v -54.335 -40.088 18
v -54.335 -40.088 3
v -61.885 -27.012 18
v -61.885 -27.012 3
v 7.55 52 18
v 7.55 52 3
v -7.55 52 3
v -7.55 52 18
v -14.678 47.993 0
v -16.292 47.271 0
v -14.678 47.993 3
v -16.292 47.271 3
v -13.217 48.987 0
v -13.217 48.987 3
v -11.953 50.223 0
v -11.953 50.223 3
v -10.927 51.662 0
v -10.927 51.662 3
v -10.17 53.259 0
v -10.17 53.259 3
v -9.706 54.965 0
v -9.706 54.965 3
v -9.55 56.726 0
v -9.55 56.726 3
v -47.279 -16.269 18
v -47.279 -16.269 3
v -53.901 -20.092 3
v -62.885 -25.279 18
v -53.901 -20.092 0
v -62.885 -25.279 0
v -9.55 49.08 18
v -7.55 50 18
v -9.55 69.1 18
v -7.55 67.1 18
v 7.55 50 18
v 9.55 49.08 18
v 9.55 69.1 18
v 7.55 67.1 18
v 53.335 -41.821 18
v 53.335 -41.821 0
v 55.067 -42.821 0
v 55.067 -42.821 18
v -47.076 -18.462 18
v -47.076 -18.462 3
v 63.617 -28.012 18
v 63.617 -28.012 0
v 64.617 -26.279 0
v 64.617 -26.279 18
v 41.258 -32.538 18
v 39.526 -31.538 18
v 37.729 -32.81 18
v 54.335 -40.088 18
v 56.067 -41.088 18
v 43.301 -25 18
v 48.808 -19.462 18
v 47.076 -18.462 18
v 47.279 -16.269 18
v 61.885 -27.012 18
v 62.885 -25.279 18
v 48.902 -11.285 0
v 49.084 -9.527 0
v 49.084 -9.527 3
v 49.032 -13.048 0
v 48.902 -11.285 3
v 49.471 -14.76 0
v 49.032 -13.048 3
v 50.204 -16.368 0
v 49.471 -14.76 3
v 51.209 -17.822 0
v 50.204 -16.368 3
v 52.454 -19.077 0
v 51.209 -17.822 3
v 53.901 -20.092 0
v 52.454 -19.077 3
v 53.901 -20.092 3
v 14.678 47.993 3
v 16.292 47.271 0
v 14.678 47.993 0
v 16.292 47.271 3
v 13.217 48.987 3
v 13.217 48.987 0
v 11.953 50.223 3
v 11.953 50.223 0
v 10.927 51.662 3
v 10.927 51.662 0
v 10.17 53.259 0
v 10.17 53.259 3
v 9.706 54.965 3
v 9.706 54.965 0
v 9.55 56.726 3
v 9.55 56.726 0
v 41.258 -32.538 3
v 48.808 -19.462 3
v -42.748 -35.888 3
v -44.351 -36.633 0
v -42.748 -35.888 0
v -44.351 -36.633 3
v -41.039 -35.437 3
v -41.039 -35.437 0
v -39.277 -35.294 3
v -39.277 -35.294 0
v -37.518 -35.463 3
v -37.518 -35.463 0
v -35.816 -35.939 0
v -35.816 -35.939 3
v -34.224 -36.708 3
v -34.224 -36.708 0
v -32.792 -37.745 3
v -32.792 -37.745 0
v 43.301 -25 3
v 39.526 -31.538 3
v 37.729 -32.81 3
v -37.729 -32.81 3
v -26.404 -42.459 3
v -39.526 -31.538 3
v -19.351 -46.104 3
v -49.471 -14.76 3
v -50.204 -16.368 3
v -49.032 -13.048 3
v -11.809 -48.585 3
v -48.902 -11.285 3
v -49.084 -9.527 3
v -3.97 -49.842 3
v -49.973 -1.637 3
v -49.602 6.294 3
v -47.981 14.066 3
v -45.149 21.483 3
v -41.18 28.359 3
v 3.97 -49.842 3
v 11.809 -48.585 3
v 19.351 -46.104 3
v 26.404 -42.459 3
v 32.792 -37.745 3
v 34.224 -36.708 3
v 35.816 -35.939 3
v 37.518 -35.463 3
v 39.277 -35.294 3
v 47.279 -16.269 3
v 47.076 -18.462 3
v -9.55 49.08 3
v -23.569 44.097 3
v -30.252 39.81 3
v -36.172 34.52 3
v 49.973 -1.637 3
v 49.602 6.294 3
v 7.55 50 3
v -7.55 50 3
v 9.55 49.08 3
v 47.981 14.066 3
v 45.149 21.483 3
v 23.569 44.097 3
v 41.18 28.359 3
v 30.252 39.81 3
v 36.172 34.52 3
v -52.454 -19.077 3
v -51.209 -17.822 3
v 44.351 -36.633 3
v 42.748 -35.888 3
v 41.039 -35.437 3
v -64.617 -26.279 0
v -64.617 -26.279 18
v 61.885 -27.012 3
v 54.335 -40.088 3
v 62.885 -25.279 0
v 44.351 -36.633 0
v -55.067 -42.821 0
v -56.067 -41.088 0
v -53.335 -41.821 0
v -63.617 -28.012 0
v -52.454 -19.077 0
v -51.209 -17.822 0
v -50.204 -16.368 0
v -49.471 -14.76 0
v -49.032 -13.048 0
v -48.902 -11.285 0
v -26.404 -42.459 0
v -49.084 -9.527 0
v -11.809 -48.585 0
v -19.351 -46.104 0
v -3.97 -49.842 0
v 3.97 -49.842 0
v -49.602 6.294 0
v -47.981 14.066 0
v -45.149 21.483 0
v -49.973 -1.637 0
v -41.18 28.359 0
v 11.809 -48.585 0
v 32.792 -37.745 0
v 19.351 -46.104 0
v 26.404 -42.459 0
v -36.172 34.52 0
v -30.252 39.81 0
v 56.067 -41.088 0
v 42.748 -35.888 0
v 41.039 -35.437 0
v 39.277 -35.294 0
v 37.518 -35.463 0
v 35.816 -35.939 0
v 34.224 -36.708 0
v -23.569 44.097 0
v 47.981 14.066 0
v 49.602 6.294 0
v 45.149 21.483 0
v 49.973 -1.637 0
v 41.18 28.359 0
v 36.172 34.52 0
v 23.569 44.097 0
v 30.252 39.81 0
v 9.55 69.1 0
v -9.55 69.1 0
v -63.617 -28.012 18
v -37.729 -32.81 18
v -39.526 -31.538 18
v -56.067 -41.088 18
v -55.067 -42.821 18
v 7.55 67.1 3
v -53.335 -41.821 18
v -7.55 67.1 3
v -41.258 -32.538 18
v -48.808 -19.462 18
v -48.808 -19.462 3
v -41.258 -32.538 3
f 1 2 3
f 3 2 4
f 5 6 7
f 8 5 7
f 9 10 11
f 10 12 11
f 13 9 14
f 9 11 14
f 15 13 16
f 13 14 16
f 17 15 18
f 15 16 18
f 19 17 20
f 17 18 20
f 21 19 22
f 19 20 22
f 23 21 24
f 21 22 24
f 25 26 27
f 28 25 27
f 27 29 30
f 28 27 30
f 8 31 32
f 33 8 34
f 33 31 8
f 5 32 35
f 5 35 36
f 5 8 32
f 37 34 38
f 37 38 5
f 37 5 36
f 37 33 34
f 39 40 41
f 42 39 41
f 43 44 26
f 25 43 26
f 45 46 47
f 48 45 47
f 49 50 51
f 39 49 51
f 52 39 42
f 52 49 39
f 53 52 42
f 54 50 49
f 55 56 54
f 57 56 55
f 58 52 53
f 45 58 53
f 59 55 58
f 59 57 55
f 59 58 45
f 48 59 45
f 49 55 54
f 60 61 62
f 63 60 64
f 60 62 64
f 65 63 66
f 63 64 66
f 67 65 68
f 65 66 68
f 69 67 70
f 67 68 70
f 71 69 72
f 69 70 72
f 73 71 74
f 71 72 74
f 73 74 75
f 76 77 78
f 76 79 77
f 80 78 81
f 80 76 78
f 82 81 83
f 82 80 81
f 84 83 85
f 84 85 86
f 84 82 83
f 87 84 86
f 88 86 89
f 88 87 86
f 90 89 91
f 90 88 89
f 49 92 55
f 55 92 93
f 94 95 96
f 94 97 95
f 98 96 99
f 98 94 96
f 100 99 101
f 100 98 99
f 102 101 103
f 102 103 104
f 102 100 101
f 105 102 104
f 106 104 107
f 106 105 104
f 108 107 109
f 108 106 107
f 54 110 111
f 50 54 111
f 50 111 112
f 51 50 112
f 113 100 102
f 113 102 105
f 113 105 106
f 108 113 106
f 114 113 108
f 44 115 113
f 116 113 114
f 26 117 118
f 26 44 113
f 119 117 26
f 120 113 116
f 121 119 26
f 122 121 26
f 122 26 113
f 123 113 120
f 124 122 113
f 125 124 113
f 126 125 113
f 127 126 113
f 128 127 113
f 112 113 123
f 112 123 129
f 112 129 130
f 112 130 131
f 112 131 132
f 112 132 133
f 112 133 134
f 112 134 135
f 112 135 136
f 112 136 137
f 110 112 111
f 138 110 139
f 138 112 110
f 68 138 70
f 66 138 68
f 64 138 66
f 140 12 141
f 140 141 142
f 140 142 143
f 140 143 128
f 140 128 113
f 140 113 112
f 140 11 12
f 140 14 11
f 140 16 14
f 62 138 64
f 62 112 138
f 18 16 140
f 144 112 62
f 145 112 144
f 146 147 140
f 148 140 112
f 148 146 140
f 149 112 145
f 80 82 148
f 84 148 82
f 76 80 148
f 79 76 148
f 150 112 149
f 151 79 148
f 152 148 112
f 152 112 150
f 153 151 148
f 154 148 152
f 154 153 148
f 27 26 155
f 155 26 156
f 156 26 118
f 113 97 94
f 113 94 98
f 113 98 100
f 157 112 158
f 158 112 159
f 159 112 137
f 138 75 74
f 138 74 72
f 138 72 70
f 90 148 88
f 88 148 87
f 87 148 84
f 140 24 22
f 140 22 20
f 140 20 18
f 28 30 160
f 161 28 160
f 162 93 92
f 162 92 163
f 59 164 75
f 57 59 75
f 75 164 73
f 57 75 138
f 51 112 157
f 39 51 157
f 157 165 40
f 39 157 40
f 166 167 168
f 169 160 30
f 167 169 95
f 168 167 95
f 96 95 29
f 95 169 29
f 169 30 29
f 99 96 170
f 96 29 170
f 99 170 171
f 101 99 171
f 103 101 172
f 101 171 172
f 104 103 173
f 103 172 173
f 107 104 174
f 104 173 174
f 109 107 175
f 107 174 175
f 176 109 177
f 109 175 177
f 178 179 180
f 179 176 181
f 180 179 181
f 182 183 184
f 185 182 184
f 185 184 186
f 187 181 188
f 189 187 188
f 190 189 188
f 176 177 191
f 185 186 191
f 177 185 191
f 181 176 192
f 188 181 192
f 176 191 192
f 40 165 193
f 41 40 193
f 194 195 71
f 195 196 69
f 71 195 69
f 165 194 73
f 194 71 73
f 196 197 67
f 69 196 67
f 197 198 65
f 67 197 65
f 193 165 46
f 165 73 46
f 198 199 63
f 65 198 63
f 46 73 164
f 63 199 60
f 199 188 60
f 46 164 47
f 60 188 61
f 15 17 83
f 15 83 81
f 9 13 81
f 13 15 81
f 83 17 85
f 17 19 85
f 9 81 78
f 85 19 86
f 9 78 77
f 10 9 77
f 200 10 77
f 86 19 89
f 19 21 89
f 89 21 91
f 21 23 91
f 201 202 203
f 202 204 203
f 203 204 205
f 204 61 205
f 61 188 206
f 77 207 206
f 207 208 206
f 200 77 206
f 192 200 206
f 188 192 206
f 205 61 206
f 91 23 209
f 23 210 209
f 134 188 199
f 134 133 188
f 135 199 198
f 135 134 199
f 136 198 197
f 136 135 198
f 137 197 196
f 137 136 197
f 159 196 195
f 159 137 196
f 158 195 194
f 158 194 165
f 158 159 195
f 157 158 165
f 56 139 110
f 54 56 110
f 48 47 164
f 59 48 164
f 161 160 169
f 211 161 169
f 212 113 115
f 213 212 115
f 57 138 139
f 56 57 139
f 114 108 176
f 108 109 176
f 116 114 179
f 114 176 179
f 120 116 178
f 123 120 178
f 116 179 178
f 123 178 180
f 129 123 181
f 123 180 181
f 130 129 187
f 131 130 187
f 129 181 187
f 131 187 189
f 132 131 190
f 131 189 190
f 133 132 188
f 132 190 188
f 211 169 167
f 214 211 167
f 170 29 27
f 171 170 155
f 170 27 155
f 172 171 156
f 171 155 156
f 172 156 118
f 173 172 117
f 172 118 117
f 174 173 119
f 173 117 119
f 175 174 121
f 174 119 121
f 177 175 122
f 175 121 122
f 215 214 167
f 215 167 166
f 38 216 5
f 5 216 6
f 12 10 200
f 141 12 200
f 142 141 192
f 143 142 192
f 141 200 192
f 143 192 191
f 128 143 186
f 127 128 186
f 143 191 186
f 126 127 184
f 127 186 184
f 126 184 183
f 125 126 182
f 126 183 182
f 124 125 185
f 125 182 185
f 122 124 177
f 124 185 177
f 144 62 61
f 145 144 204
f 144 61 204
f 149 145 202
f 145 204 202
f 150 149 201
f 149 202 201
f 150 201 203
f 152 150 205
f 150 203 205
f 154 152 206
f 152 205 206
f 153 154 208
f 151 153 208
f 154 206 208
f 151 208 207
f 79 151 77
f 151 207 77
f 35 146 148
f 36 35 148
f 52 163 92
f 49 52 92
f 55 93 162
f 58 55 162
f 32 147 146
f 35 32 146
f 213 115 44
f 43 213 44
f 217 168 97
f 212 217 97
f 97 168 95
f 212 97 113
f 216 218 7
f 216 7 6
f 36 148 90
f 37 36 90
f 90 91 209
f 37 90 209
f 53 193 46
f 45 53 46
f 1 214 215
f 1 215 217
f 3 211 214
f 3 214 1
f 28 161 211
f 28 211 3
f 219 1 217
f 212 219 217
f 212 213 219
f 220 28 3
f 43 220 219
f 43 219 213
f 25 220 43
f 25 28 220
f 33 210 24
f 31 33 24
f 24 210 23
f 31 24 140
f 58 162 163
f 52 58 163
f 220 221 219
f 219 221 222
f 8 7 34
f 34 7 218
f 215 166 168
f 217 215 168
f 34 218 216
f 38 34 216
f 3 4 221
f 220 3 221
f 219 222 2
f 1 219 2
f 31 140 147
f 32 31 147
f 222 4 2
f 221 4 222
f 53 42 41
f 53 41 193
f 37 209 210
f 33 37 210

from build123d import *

# Parameters (mm, degrees)
F0_R     = 50
F1_DEPTH = 3
F2_W     = 15.1
F2_H     = 15.1
F3_DEPTH = 3
F2_H_2   = 2
F2_W_2   = 2
F4_DEPTH = 18
F5_R     = 10


with BuildPart() as f1:
    # F0 (on Top) → F1 (new body)
    with BuildSketch(Plane.XY):
        Circle(F0_R)
    extrude(amount=F1_DEPTH)

    # F2 (on Top) → F3, piece 3 (join)
    with BuildSketch(Plane.XY):
        with BuildLine():
            ThreePointArc((-9.55, 49.0795018312), (-4.7971297897, 49.7693434333), (0, 50))
            Line((0, 50), (-7.55, 50))
            Line((-7.55, 50), (-9.55, 49.0795018312))
        make_face()
        with BuildLine():
            ThreePointArc((0, 50), (4.7971297897, 49.7693434333), (9.55, 49.0795018312))
            Line((9.55, 49.0795018312), (7.55, 50))
            Line((7.55, 50), (0, 50))
        make_face()
        with BuildLine():
            Line((47.0762701892, -18.4615082014), (47.2790953909, -16.2692083095))
            ThreePointArc((47.2790953909, -16.2692083095), (45.5000807553, -20.7302351954), (43.3012704728, -24.9999995088))
            Line((43.3012704728, -24.9999995088), (47.0762701892, -18.4615082014))
        make_face()
        with BuildLine():
            Line((39.5262701892, -31.5384917986), (43.3012704728, -24.9999995088))
            ThreePointArc((43.3012704728, -24.9999995088), (40.7029510127, -29.039107749), (37.7290953909, -32.8102935217))
            Line((37.7290953909, -32.8102935217), (39.5262701892, -31.5384917986))
        make_face()
        with BuildLine():
            ThreePointArc((-43.3012707255, -24.9999990711), (-45.5000808601, -20.7302349654), (-47.2790953909, -16.2692083095))
            Line((-47.2790953909, -16.2692083095), (-47.0762701892, -18.4615082014))
            Line((-47.0762701892, -18.4615082014), (-43.3012707255, -24.9999990711))
        make_face()
        with BuildLine():
            Line((-39.5262701892, -31.5384917986), (-37.7290953909, -32.8102935217))
            ThreePointArc((-37.7290953909, -32.8102935217), (-40.7029511595, -29.0391075432), (-43.3012707255, -24.9999990711))
            Line((-43.3012707255, -24.9999990711), (-39.5262701892, -31.5384917986))
        make_face()
    extrude(amount=F3_DEPTH)



with BuildPart() as f3:
    # F2 (on Top) → F3 (new body)
    with BuildSketch(Plane.XY):
        with Locations((0, 59.55)):
            Rectangle(F2_W, F2_H)
    extrude(amount=F3_DEPTH)


with BuildPart() as f3b:
    # F2 (on Top) → F3, piece 2 (new body)
    with BuildSketch(Plane.XY):
        Polygon((54.3353045939, -40.0884917986), (61.8853045939, -27.0115082014), (48.8083209968, -19.4615082014), (41.2583209968, -32.5384917986), align=None)
    extrude(amount=F3_DEPTH)


with BuildPart() as f3c:
    # F2 (on Top) → F3, piece 4 (new body)
    with BuildSketch(Plane.XY):
        Polygon((-48.8083209968, -19.4615082014), (-61.8853045939, -27.0115082014), (-54.3353045939, -40.0884917986), (-41.2583209968, -32.5384917986), align=None)
    extrude(amount=F3_DEPTH)


with BuildPart() as f1_1:
    add(f1.part)

    add(f3.part)  # F4 merges F3

    add(f3b.part)  # F4 merges F3b

    add(f3c.part)  # F4 merges F3c
    # F2 (on Top) → F4 (join)
    with BuildSketch(Plane.XY):
        Polygon((-47.0762701892, -18.4615082014), (-47.2790953909, -16.2692083095), (-62.8853045939, -25.2794573939), (-61.8853045939, -27.0115082014), (-48.8083209968, -19.4615082014), align=None)
        Polygon((-39.5262701892, -31.5384917986), (-43.3012707255, -24.9999990711), (-47.0762701892, -18.4615082014), (-48.8083209968, -19.4615082014), (-41.2583209968, -32.5384917986), align=None)
        Polygon((-53.3353045939, -41.8205426061), (-37.7290953909, -32.8102935217), (-39.5262701892, -31.5384917986), (-41.2583209968, -32.5384917986), (-54.3353045939, -40.0884917986), align=None)
        Polygon((-54.3353045939, -40.0884917986), (-61.8853045939, -27.0115082014), (-63.6173554015, -28.0115082014), (-56.0673554015, -41.0884917986), align=None)
        Polygon((-61.8853045939, -27.0115082014), (-62.8853045939, -25.2794573939), (-64.6173554015, -26.2794573939), (-63.6173554015, -28.0115082014), align=None)
        Polygon((-55.0673554015, -42.8205426061), (-53.3353045939, -41.8205426061), (-54.3353045939, -40.0884917986), (-56.0673554015, -41.0884917986), align=None)
        Polygon((47.0762701892, -18.4615082014), (43.3012704728, -24.9999995088), (39.5262701892, -31.5384917986), (41.2583209968, -32.5384917986), (48.8083209968, -19.4615082014), align=None)
        Polygon((62.8853045939, -25.2794573939), (47.2790953909, -16.2692083095), (47.0762701892, -18.4615082014), (48.8083209968, -19.4615082014), (61.8853045939, -27.0115082014), align=None)
        Polygon((64.6173554015, -26.2794573939), (62.8853045939, -25.2794573939), (61.8853045939, -27.0115082014), (63.6173554015, -28.0115082014), align=None)
        Polygon((63.6173554015, -28.0115082014), (61.8853045939, -27.0115082014), (54.3353045939, -40.0884917986), (56.0673554015, -41.0884917986), align=None)
        Polygon((54.3353045939, -40.0884917986), (53.3353045939, -41.8205426061), (55.0673554015, -42.8205426061), (56.0673554015, -41.0884917986), align=None)
        Polygon((39.5262701892, -31.5384917986), (37.7290953909, -32.8102935217), (53.3353045939, -41.8205426061), (54.3353045939, -40.0884917986), (41.2583209968, -32.5384917986), align=None)
        with Locations((0, 68.1)):
            Rectangle(F2_W, F2_H_2)
        with Locations((-8.55, 68.1)):
            Rectangle(F2_W_2, F2_H_2)
        with Locations((8.55, 68.1)):
            Rectangle(F2_W_2, F2_H_2)
        Polygon((7.55, 50), (9.55, 49.0795018312), (9.55, 67.1), (7.55, 67.1), (7.55, 52), align=None)
        Polygon((-9.55, 67.1), (-9.55, 49.0795018312), (-7.55, 50), (-7.55, 52), (-7.55, 67.1), align=None)
        Polygon((-7.55, 50), (0, 50), (7.55, 50), (7.55, 52), (-7.55, 52), align=None)
    extrude(amount=F4_DEPTH)

    # F5
    f5_edges = [f1_1.edges().sort_by_distance(p)[0] for p in [
        (-9.55, 49.079502, 1.5),
        (9.55, 49.079502, 1.5),
        (-47.279095, -16.269208, 1.5),
        (-37.729095, -32.810294, 1.5),
        (37.729095, -32.810294, 1.5),
        (47.279095, -16.269208, 1.5),
    ]]
    fillet(f5_edges, radius=F5_R)


solid = f1_1.part
